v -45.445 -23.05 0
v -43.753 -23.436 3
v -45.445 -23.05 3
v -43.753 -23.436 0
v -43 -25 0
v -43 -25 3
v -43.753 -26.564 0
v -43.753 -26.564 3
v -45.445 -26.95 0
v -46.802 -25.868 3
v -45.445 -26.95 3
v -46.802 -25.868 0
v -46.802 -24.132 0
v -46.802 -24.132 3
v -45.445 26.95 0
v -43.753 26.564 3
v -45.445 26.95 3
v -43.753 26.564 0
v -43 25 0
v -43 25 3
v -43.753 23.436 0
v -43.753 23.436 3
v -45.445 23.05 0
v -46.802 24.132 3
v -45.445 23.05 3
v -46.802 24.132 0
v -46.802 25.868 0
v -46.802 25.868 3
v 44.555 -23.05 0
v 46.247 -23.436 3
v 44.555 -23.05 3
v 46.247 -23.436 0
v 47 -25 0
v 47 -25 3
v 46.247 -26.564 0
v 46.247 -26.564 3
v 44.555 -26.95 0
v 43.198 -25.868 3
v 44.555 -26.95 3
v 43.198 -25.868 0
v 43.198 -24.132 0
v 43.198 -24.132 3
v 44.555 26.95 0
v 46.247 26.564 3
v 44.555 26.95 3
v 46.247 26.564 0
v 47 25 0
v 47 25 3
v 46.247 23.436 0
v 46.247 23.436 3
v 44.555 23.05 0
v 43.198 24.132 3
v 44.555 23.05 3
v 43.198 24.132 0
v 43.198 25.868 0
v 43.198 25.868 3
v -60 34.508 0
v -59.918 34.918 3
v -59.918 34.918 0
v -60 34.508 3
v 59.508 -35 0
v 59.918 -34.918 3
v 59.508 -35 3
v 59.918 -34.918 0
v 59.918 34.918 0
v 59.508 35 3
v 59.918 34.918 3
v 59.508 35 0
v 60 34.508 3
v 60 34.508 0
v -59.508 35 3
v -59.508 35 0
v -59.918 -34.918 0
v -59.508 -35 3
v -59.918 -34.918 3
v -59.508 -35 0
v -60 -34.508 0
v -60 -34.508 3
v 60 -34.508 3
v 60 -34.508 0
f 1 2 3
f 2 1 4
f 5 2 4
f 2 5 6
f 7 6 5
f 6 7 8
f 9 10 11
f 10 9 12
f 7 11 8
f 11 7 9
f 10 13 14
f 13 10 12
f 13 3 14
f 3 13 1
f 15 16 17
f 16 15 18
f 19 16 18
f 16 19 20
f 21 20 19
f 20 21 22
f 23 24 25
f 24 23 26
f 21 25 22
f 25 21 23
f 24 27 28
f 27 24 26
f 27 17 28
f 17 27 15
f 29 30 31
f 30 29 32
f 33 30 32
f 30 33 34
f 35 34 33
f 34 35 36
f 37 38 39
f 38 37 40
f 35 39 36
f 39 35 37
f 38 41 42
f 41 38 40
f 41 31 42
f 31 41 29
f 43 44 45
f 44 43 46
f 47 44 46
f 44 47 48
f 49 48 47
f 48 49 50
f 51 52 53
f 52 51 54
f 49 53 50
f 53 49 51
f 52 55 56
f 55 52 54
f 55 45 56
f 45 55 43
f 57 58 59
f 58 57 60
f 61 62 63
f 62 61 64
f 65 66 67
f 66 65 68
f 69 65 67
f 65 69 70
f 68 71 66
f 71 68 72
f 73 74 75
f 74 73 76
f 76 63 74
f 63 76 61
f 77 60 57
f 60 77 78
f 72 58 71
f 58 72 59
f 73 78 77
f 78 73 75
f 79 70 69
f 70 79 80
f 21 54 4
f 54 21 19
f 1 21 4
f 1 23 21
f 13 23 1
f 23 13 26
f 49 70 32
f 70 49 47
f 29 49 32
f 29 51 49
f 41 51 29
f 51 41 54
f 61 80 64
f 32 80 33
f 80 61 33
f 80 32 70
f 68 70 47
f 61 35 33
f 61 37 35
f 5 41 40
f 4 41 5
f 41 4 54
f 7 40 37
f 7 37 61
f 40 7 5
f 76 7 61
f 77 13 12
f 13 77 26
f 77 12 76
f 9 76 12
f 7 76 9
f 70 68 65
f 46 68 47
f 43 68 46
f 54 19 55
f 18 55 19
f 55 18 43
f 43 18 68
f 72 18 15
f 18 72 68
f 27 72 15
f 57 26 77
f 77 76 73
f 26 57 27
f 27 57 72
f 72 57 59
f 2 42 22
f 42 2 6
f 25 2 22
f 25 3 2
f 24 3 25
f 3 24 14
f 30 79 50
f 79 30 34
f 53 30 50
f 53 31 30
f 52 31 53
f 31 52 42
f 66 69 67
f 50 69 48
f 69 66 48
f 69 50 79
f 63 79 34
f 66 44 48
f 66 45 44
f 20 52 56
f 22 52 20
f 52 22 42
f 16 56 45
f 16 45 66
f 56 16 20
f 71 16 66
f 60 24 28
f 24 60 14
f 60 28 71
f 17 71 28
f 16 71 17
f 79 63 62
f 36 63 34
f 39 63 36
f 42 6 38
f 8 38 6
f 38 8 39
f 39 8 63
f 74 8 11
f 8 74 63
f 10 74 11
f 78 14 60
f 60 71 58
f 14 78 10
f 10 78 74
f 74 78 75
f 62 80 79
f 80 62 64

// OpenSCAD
plate_width = 120; // [80:1:200]
plate_height = 70; // [50:1:150]
plate_thickness = 3; // [1:0.1:10]
corner_radius = 5; // [0:0.1:20]
screw_hole_offset_x = 45; // [20:1:90]
screw_hole_offset_y = 25; // [10:1:60]
screw_hole_diameter = 4; // [2:0.1:8]
add_countersink = false; // [true:false]
countersink_diameter = 8; // [4:0.1:12]
countersink_depth = 2; // [0.5:0.1:5]


module plate_profile() {
    effective_radius = min(corner_radius, plate_width/2, plate_height/2);
    offset(r = -effective_radius)
        offset(r = effective_radius)
            square([plate_width, plate_height], center = true);
}

module screw_hole() {
    translate([0, 0, -0.1])
        cylinder(h = plate_thickness + 0.2, d = screw_hole_diameter, center = false);
    if (add_countersink) {
        effective_countersink_depth = min(countersink_depth, plate_thickness);
        translate([0, 0, plate_thickness - effective_countersink_depth])
            cylinder(h = effective_countersink_depth + 0.1, d1 = screw_hole_diameter, d2 = countersink_diameter, center = false);
    }
}

module wall_cover_plate() {
    difference() {
        linear_extrude(height = plate_thickness)
            plate_profile();
        for (x = [-screw_hole_offset_x, screw_hole_offset_x])
            for (y = [-screw_hole_offset_y, screw_hole_offset_y])
                translate([x, y, 0])
                    screw_hole();

    }
}

wall_cover_plate();
